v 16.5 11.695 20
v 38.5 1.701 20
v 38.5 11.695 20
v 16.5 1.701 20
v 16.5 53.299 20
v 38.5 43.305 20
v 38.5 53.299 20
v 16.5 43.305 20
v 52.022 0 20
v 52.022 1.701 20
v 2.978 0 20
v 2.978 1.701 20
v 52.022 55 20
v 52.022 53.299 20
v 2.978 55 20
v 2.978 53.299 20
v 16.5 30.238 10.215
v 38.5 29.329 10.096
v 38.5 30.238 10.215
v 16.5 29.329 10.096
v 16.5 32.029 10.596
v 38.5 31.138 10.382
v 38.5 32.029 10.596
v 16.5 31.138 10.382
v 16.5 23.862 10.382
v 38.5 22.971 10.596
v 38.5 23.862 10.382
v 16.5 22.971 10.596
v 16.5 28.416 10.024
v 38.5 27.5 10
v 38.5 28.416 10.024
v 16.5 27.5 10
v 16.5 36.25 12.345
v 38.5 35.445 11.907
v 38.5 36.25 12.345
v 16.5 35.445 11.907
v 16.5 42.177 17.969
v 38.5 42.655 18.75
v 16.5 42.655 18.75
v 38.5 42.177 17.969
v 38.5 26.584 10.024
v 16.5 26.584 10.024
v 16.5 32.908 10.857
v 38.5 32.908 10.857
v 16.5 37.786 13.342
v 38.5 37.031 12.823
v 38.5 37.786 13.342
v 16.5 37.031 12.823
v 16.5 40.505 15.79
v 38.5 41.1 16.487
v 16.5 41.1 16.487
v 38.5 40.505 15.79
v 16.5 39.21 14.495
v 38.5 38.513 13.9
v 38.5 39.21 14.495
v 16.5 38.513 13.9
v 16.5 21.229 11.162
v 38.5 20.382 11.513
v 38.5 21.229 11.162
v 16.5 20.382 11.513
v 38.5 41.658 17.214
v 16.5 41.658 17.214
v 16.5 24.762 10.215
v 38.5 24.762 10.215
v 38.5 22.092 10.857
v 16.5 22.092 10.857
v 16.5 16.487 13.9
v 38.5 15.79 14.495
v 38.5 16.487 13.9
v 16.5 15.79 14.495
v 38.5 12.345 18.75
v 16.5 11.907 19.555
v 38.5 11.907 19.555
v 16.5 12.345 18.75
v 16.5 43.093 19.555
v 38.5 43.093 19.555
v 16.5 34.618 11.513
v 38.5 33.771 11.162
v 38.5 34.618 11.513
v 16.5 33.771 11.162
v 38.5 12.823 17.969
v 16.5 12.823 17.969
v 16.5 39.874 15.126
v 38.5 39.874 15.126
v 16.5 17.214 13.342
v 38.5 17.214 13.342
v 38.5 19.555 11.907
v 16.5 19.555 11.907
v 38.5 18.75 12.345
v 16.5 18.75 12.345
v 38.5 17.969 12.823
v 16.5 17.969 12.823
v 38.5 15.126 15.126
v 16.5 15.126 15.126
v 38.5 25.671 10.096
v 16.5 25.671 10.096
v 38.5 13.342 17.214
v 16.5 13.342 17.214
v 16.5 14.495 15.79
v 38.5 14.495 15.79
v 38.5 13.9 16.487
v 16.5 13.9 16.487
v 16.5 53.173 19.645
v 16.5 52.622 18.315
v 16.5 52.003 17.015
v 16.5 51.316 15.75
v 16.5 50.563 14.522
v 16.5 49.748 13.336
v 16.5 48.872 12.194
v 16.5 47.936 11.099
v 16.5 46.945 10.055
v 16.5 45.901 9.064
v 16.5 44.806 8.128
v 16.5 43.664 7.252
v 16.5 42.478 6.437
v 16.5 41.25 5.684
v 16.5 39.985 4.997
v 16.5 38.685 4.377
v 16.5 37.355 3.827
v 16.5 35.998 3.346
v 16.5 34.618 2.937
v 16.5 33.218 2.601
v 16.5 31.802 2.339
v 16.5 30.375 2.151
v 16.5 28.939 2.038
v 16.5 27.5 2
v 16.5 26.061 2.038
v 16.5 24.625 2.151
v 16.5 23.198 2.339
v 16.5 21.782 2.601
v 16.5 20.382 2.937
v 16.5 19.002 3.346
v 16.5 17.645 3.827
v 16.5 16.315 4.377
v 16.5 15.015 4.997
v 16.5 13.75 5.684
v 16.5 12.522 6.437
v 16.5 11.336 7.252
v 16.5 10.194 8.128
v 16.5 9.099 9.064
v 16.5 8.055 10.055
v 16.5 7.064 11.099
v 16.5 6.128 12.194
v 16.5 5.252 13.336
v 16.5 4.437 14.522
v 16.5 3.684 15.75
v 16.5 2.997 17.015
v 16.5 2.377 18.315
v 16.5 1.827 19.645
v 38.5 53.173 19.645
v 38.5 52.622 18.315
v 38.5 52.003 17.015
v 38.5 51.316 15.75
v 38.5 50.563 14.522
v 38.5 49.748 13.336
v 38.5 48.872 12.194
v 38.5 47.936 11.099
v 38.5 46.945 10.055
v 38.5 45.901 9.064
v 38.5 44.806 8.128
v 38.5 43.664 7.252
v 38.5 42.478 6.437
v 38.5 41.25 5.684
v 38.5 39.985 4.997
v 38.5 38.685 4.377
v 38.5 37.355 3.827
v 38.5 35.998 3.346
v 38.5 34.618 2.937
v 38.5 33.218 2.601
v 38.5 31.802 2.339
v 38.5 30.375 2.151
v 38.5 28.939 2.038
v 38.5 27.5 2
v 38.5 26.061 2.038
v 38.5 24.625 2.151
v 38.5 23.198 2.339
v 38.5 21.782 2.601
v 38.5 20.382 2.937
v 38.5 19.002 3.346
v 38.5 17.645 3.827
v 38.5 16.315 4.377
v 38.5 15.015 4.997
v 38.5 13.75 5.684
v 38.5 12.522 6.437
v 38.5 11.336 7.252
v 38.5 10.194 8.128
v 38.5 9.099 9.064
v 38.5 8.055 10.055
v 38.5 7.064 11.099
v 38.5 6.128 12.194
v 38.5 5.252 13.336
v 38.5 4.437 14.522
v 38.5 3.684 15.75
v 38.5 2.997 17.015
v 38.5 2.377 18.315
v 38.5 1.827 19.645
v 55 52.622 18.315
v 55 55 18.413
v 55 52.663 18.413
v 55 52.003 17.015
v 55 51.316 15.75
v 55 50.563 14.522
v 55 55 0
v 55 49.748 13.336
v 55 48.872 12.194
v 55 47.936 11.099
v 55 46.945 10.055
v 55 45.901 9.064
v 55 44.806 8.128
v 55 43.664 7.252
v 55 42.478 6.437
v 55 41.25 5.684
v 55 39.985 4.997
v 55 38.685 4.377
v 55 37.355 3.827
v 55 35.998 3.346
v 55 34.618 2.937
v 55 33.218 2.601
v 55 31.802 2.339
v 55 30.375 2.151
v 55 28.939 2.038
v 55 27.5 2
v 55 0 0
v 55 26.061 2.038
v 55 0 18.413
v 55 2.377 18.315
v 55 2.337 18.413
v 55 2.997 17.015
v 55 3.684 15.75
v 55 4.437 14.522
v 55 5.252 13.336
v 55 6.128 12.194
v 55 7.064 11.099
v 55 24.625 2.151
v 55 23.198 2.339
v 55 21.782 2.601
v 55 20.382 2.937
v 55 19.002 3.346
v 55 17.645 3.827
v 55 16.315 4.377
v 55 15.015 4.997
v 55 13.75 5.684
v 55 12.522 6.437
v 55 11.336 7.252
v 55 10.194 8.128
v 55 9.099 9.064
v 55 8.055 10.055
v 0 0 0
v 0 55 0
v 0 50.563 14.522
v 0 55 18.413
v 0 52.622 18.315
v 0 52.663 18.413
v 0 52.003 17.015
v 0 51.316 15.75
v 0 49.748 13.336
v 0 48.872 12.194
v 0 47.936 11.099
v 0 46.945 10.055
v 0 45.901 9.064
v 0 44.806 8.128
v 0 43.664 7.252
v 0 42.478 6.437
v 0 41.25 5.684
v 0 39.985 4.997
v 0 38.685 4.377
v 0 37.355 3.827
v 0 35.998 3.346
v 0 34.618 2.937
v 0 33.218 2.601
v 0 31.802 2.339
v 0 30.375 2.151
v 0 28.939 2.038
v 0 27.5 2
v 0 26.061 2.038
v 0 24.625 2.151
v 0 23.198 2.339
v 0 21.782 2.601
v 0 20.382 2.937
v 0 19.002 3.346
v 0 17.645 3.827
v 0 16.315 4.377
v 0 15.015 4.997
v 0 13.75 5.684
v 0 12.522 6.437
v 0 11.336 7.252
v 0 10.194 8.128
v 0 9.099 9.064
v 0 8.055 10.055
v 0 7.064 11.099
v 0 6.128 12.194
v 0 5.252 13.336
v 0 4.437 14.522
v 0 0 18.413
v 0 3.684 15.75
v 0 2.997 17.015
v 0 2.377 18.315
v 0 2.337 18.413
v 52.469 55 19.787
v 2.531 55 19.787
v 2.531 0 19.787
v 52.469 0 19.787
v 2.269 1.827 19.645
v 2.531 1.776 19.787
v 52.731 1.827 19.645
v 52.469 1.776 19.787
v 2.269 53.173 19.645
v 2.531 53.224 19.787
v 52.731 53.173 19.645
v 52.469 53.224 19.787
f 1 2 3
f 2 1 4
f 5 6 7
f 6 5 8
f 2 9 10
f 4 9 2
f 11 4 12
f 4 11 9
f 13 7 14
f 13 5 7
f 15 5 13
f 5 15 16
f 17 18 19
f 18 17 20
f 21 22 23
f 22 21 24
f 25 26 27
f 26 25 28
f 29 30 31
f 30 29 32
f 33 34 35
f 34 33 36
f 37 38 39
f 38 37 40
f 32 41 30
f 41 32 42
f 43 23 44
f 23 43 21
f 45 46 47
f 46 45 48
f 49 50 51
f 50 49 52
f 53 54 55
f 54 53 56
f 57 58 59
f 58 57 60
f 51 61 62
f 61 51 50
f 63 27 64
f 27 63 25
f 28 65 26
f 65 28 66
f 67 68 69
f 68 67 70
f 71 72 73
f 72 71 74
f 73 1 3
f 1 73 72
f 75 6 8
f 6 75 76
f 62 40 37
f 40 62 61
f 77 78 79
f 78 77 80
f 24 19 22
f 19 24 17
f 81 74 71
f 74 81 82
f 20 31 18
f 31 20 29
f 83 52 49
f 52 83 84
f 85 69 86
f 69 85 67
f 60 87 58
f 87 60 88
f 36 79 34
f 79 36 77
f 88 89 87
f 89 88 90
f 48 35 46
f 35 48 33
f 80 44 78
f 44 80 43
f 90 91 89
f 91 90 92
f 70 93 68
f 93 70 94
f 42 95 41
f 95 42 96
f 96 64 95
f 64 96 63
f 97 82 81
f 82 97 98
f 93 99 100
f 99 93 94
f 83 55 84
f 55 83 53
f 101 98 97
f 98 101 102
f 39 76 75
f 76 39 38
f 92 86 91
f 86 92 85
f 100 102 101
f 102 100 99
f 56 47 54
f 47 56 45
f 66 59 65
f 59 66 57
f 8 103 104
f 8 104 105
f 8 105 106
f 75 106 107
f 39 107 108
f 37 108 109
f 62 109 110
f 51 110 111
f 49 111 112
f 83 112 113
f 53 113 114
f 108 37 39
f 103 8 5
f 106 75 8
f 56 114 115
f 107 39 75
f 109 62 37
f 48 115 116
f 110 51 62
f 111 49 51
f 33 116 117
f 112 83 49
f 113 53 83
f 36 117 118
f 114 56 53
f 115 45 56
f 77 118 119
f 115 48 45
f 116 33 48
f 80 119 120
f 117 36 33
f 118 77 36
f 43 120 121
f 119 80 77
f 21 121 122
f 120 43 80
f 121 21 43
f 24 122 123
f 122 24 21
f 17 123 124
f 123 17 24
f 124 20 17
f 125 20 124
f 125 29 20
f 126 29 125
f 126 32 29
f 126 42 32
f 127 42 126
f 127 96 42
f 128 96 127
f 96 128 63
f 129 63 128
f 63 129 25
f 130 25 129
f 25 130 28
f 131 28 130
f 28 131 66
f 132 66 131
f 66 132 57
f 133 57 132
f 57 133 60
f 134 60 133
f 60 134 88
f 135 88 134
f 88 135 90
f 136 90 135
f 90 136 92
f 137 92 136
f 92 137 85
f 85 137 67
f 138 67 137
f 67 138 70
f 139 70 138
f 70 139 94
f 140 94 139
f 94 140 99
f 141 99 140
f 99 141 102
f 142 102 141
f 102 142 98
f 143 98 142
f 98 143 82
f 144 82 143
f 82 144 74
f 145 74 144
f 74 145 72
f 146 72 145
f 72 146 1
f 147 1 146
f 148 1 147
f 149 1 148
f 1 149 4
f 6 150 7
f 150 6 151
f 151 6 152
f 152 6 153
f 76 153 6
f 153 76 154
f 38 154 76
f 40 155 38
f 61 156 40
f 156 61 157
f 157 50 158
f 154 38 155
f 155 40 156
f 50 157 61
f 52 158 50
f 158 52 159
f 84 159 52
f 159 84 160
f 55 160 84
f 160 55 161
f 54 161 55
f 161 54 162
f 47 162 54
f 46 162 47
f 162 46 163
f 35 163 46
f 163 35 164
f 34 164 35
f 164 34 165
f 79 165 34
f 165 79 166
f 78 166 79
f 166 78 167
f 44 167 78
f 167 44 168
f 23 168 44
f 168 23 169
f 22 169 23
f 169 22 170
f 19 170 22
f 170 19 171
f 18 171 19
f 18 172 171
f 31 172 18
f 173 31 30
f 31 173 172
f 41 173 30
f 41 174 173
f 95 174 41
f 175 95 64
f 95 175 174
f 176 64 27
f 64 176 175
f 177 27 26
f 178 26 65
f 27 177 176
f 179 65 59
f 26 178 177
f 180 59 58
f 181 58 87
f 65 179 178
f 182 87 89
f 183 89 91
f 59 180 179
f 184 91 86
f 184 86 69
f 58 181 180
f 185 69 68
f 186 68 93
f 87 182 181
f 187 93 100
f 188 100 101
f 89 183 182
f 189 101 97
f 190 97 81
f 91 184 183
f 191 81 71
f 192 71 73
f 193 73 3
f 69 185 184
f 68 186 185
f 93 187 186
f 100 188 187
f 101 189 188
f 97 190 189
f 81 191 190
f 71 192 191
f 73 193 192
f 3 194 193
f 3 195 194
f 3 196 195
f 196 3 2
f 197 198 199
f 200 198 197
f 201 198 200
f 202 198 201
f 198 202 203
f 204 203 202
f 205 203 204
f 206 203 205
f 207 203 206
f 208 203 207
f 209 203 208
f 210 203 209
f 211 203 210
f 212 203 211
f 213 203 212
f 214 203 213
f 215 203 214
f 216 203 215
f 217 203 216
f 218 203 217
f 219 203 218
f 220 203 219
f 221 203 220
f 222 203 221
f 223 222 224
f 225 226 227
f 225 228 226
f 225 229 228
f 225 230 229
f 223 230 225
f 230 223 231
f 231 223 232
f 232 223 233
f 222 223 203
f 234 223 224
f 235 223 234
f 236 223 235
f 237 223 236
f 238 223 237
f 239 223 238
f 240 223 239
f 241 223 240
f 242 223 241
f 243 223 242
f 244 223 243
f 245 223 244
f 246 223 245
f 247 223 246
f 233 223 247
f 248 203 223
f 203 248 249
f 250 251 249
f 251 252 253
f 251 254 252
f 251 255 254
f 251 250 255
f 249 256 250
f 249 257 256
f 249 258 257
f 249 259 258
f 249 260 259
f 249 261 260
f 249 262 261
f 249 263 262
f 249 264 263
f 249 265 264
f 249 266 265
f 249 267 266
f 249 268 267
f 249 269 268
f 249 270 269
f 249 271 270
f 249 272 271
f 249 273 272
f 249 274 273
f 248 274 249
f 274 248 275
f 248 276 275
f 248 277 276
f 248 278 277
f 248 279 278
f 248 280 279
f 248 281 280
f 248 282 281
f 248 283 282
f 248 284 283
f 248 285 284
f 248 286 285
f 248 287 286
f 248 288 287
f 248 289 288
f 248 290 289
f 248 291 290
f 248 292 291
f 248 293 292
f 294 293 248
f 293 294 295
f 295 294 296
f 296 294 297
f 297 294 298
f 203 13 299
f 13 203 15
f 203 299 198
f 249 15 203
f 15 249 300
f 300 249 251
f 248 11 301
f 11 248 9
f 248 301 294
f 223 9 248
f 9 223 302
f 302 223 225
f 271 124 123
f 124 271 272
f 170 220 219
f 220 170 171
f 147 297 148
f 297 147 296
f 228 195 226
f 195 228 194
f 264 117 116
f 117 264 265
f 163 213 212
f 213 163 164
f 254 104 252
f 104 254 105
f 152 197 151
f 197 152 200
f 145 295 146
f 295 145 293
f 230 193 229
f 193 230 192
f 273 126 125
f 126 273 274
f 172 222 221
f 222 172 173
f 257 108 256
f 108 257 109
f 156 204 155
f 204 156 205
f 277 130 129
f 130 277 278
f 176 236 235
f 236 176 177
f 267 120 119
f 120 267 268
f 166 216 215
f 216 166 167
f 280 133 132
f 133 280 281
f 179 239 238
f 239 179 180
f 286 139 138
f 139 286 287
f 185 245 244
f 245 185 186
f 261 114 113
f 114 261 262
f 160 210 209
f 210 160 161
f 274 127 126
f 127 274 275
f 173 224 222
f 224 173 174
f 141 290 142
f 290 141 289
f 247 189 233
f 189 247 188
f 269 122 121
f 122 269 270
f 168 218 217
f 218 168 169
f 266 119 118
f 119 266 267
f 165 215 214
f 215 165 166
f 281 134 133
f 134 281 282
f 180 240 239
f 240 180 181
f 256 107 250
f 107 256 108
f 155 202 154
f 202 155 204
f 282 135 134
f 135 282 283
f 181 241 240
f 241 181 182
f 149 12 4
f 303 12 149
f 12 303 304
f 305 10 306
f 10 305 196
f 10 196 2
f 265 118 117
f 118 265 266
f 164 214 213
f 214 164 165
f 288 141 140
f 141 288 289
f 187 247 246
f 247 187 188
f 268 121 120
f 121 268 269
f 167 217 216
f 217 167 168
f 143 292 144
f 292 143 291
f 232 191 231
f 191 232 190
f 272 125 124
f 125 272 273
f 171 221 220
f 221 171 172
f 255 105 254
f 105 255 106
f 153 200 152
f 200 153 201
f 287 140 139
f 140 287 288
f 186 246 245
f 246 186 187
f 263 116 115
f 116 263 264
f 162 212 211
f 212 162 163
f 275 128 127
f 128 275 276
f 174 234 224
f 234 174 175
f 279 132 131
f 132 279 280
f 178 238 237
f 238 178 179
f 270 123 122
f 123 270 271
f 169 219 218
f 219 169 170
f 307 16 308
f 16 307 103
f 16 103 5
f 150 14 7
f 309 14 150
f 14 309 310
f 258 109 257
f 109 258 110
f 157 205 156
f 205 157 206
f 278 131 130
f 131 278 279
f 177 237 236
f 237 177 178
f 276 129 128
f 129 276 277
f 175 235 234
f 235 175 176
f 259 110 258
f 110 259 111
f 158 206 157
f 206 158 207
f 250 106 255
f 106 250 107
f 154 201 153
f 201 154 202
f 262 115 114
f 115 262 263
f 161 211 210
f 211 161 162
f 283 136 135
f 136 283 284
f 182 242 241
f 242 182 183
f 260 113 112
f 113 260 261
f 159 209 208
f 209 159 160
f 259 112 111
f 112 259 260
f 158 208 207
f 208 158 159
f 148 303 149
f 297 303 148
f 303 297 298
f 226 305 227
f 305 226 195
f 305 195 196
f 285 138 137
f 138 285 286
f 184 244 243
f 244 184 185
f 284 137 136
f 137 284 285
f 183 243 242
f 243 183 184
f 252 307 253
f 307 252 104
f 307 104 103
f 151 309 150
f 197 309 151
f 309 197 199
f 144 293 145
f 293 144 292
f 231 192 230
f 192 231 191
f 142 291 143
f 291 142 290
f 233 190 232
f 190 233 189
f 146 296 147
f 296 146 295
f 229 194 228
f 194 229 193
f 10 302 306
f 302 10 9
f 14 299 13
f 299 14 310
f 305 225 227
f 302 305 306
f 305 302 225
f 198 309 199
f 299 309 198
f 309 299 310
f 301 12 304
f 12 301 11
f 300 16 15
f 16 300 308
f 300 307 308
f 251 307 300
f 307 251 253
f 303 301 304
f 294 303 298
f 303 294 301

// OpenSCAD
////////////////////////////
// VARIABLES



/* [Wheel] */

//Wheel Diameter
wheelDiameter = 55;

wheelRadius = wheelDiameter/2;

//Thickness of Entire Wheel Structure
wheelThickness = 54;

//Space Between Wheels
wheelSpace = 22;


/* [Brake] */

//Height of Brake
boxHeight = 20;

boxThickness = wheelThickness+1;

//Brake Floor Thickness
boxBottomThickness = 2;

//Approx Groove Size for Inner Brace
innerBraceGroove = 35;


/* [Hidden] */
$fn=120;


////////////////////////////
// RENDER
intersection()
{
    //ROUNDED CORNER
    translate([boxThickness/2,wheelDiameter,-((wheelThickness+1)*(17/32))]) rotate([90,0,0]) cylinder(r=wheelThickness+1, h=wheelDiameter);
    
    union()
    {
        translate ([((wheelThickness+1)/2)-(wheelSpace/2),0,(wheelDiameter/2)])
        //INNER BRACE
        difference()
        {
            //BRACE
            translate([0,wheelDiameter/2,0]) rotate([0,90,0]) 
                cylinder(h=wheelSpace, d=wheelDiameter);
                        
            union()
            {
                //Brace Top Subtraction
                translate([-(wheelThickness/2) + (wheelSpace/2) ,0,boxHeight-(wheelRadius)]) 
                    cube([wheelThickness, wheelDiameter+1, wheelDiameter - boxHeight]);
                //Brace Groove Subtraction
                translate([-.1,wheelDiameter/2,0]) rotate([0,90,0]) cylinder(h=wheelSpace+1, d=innerBraceGroove);
             }
        }
        
        //MAIN BLOCK
        difference()
        {
        
            cube([boxThickness,wheelDiameter,boxHeight]);
            
            rotate([0,90,0])
             translate([-(wheelDiameter/2+boxBottomThickness),wheelDiameter/2,-.1])
         cylinder (h=wheelThickness+2, d=wheelDiameter);
            
            
        }
    }
}
////////////////////////////
// MODULES
